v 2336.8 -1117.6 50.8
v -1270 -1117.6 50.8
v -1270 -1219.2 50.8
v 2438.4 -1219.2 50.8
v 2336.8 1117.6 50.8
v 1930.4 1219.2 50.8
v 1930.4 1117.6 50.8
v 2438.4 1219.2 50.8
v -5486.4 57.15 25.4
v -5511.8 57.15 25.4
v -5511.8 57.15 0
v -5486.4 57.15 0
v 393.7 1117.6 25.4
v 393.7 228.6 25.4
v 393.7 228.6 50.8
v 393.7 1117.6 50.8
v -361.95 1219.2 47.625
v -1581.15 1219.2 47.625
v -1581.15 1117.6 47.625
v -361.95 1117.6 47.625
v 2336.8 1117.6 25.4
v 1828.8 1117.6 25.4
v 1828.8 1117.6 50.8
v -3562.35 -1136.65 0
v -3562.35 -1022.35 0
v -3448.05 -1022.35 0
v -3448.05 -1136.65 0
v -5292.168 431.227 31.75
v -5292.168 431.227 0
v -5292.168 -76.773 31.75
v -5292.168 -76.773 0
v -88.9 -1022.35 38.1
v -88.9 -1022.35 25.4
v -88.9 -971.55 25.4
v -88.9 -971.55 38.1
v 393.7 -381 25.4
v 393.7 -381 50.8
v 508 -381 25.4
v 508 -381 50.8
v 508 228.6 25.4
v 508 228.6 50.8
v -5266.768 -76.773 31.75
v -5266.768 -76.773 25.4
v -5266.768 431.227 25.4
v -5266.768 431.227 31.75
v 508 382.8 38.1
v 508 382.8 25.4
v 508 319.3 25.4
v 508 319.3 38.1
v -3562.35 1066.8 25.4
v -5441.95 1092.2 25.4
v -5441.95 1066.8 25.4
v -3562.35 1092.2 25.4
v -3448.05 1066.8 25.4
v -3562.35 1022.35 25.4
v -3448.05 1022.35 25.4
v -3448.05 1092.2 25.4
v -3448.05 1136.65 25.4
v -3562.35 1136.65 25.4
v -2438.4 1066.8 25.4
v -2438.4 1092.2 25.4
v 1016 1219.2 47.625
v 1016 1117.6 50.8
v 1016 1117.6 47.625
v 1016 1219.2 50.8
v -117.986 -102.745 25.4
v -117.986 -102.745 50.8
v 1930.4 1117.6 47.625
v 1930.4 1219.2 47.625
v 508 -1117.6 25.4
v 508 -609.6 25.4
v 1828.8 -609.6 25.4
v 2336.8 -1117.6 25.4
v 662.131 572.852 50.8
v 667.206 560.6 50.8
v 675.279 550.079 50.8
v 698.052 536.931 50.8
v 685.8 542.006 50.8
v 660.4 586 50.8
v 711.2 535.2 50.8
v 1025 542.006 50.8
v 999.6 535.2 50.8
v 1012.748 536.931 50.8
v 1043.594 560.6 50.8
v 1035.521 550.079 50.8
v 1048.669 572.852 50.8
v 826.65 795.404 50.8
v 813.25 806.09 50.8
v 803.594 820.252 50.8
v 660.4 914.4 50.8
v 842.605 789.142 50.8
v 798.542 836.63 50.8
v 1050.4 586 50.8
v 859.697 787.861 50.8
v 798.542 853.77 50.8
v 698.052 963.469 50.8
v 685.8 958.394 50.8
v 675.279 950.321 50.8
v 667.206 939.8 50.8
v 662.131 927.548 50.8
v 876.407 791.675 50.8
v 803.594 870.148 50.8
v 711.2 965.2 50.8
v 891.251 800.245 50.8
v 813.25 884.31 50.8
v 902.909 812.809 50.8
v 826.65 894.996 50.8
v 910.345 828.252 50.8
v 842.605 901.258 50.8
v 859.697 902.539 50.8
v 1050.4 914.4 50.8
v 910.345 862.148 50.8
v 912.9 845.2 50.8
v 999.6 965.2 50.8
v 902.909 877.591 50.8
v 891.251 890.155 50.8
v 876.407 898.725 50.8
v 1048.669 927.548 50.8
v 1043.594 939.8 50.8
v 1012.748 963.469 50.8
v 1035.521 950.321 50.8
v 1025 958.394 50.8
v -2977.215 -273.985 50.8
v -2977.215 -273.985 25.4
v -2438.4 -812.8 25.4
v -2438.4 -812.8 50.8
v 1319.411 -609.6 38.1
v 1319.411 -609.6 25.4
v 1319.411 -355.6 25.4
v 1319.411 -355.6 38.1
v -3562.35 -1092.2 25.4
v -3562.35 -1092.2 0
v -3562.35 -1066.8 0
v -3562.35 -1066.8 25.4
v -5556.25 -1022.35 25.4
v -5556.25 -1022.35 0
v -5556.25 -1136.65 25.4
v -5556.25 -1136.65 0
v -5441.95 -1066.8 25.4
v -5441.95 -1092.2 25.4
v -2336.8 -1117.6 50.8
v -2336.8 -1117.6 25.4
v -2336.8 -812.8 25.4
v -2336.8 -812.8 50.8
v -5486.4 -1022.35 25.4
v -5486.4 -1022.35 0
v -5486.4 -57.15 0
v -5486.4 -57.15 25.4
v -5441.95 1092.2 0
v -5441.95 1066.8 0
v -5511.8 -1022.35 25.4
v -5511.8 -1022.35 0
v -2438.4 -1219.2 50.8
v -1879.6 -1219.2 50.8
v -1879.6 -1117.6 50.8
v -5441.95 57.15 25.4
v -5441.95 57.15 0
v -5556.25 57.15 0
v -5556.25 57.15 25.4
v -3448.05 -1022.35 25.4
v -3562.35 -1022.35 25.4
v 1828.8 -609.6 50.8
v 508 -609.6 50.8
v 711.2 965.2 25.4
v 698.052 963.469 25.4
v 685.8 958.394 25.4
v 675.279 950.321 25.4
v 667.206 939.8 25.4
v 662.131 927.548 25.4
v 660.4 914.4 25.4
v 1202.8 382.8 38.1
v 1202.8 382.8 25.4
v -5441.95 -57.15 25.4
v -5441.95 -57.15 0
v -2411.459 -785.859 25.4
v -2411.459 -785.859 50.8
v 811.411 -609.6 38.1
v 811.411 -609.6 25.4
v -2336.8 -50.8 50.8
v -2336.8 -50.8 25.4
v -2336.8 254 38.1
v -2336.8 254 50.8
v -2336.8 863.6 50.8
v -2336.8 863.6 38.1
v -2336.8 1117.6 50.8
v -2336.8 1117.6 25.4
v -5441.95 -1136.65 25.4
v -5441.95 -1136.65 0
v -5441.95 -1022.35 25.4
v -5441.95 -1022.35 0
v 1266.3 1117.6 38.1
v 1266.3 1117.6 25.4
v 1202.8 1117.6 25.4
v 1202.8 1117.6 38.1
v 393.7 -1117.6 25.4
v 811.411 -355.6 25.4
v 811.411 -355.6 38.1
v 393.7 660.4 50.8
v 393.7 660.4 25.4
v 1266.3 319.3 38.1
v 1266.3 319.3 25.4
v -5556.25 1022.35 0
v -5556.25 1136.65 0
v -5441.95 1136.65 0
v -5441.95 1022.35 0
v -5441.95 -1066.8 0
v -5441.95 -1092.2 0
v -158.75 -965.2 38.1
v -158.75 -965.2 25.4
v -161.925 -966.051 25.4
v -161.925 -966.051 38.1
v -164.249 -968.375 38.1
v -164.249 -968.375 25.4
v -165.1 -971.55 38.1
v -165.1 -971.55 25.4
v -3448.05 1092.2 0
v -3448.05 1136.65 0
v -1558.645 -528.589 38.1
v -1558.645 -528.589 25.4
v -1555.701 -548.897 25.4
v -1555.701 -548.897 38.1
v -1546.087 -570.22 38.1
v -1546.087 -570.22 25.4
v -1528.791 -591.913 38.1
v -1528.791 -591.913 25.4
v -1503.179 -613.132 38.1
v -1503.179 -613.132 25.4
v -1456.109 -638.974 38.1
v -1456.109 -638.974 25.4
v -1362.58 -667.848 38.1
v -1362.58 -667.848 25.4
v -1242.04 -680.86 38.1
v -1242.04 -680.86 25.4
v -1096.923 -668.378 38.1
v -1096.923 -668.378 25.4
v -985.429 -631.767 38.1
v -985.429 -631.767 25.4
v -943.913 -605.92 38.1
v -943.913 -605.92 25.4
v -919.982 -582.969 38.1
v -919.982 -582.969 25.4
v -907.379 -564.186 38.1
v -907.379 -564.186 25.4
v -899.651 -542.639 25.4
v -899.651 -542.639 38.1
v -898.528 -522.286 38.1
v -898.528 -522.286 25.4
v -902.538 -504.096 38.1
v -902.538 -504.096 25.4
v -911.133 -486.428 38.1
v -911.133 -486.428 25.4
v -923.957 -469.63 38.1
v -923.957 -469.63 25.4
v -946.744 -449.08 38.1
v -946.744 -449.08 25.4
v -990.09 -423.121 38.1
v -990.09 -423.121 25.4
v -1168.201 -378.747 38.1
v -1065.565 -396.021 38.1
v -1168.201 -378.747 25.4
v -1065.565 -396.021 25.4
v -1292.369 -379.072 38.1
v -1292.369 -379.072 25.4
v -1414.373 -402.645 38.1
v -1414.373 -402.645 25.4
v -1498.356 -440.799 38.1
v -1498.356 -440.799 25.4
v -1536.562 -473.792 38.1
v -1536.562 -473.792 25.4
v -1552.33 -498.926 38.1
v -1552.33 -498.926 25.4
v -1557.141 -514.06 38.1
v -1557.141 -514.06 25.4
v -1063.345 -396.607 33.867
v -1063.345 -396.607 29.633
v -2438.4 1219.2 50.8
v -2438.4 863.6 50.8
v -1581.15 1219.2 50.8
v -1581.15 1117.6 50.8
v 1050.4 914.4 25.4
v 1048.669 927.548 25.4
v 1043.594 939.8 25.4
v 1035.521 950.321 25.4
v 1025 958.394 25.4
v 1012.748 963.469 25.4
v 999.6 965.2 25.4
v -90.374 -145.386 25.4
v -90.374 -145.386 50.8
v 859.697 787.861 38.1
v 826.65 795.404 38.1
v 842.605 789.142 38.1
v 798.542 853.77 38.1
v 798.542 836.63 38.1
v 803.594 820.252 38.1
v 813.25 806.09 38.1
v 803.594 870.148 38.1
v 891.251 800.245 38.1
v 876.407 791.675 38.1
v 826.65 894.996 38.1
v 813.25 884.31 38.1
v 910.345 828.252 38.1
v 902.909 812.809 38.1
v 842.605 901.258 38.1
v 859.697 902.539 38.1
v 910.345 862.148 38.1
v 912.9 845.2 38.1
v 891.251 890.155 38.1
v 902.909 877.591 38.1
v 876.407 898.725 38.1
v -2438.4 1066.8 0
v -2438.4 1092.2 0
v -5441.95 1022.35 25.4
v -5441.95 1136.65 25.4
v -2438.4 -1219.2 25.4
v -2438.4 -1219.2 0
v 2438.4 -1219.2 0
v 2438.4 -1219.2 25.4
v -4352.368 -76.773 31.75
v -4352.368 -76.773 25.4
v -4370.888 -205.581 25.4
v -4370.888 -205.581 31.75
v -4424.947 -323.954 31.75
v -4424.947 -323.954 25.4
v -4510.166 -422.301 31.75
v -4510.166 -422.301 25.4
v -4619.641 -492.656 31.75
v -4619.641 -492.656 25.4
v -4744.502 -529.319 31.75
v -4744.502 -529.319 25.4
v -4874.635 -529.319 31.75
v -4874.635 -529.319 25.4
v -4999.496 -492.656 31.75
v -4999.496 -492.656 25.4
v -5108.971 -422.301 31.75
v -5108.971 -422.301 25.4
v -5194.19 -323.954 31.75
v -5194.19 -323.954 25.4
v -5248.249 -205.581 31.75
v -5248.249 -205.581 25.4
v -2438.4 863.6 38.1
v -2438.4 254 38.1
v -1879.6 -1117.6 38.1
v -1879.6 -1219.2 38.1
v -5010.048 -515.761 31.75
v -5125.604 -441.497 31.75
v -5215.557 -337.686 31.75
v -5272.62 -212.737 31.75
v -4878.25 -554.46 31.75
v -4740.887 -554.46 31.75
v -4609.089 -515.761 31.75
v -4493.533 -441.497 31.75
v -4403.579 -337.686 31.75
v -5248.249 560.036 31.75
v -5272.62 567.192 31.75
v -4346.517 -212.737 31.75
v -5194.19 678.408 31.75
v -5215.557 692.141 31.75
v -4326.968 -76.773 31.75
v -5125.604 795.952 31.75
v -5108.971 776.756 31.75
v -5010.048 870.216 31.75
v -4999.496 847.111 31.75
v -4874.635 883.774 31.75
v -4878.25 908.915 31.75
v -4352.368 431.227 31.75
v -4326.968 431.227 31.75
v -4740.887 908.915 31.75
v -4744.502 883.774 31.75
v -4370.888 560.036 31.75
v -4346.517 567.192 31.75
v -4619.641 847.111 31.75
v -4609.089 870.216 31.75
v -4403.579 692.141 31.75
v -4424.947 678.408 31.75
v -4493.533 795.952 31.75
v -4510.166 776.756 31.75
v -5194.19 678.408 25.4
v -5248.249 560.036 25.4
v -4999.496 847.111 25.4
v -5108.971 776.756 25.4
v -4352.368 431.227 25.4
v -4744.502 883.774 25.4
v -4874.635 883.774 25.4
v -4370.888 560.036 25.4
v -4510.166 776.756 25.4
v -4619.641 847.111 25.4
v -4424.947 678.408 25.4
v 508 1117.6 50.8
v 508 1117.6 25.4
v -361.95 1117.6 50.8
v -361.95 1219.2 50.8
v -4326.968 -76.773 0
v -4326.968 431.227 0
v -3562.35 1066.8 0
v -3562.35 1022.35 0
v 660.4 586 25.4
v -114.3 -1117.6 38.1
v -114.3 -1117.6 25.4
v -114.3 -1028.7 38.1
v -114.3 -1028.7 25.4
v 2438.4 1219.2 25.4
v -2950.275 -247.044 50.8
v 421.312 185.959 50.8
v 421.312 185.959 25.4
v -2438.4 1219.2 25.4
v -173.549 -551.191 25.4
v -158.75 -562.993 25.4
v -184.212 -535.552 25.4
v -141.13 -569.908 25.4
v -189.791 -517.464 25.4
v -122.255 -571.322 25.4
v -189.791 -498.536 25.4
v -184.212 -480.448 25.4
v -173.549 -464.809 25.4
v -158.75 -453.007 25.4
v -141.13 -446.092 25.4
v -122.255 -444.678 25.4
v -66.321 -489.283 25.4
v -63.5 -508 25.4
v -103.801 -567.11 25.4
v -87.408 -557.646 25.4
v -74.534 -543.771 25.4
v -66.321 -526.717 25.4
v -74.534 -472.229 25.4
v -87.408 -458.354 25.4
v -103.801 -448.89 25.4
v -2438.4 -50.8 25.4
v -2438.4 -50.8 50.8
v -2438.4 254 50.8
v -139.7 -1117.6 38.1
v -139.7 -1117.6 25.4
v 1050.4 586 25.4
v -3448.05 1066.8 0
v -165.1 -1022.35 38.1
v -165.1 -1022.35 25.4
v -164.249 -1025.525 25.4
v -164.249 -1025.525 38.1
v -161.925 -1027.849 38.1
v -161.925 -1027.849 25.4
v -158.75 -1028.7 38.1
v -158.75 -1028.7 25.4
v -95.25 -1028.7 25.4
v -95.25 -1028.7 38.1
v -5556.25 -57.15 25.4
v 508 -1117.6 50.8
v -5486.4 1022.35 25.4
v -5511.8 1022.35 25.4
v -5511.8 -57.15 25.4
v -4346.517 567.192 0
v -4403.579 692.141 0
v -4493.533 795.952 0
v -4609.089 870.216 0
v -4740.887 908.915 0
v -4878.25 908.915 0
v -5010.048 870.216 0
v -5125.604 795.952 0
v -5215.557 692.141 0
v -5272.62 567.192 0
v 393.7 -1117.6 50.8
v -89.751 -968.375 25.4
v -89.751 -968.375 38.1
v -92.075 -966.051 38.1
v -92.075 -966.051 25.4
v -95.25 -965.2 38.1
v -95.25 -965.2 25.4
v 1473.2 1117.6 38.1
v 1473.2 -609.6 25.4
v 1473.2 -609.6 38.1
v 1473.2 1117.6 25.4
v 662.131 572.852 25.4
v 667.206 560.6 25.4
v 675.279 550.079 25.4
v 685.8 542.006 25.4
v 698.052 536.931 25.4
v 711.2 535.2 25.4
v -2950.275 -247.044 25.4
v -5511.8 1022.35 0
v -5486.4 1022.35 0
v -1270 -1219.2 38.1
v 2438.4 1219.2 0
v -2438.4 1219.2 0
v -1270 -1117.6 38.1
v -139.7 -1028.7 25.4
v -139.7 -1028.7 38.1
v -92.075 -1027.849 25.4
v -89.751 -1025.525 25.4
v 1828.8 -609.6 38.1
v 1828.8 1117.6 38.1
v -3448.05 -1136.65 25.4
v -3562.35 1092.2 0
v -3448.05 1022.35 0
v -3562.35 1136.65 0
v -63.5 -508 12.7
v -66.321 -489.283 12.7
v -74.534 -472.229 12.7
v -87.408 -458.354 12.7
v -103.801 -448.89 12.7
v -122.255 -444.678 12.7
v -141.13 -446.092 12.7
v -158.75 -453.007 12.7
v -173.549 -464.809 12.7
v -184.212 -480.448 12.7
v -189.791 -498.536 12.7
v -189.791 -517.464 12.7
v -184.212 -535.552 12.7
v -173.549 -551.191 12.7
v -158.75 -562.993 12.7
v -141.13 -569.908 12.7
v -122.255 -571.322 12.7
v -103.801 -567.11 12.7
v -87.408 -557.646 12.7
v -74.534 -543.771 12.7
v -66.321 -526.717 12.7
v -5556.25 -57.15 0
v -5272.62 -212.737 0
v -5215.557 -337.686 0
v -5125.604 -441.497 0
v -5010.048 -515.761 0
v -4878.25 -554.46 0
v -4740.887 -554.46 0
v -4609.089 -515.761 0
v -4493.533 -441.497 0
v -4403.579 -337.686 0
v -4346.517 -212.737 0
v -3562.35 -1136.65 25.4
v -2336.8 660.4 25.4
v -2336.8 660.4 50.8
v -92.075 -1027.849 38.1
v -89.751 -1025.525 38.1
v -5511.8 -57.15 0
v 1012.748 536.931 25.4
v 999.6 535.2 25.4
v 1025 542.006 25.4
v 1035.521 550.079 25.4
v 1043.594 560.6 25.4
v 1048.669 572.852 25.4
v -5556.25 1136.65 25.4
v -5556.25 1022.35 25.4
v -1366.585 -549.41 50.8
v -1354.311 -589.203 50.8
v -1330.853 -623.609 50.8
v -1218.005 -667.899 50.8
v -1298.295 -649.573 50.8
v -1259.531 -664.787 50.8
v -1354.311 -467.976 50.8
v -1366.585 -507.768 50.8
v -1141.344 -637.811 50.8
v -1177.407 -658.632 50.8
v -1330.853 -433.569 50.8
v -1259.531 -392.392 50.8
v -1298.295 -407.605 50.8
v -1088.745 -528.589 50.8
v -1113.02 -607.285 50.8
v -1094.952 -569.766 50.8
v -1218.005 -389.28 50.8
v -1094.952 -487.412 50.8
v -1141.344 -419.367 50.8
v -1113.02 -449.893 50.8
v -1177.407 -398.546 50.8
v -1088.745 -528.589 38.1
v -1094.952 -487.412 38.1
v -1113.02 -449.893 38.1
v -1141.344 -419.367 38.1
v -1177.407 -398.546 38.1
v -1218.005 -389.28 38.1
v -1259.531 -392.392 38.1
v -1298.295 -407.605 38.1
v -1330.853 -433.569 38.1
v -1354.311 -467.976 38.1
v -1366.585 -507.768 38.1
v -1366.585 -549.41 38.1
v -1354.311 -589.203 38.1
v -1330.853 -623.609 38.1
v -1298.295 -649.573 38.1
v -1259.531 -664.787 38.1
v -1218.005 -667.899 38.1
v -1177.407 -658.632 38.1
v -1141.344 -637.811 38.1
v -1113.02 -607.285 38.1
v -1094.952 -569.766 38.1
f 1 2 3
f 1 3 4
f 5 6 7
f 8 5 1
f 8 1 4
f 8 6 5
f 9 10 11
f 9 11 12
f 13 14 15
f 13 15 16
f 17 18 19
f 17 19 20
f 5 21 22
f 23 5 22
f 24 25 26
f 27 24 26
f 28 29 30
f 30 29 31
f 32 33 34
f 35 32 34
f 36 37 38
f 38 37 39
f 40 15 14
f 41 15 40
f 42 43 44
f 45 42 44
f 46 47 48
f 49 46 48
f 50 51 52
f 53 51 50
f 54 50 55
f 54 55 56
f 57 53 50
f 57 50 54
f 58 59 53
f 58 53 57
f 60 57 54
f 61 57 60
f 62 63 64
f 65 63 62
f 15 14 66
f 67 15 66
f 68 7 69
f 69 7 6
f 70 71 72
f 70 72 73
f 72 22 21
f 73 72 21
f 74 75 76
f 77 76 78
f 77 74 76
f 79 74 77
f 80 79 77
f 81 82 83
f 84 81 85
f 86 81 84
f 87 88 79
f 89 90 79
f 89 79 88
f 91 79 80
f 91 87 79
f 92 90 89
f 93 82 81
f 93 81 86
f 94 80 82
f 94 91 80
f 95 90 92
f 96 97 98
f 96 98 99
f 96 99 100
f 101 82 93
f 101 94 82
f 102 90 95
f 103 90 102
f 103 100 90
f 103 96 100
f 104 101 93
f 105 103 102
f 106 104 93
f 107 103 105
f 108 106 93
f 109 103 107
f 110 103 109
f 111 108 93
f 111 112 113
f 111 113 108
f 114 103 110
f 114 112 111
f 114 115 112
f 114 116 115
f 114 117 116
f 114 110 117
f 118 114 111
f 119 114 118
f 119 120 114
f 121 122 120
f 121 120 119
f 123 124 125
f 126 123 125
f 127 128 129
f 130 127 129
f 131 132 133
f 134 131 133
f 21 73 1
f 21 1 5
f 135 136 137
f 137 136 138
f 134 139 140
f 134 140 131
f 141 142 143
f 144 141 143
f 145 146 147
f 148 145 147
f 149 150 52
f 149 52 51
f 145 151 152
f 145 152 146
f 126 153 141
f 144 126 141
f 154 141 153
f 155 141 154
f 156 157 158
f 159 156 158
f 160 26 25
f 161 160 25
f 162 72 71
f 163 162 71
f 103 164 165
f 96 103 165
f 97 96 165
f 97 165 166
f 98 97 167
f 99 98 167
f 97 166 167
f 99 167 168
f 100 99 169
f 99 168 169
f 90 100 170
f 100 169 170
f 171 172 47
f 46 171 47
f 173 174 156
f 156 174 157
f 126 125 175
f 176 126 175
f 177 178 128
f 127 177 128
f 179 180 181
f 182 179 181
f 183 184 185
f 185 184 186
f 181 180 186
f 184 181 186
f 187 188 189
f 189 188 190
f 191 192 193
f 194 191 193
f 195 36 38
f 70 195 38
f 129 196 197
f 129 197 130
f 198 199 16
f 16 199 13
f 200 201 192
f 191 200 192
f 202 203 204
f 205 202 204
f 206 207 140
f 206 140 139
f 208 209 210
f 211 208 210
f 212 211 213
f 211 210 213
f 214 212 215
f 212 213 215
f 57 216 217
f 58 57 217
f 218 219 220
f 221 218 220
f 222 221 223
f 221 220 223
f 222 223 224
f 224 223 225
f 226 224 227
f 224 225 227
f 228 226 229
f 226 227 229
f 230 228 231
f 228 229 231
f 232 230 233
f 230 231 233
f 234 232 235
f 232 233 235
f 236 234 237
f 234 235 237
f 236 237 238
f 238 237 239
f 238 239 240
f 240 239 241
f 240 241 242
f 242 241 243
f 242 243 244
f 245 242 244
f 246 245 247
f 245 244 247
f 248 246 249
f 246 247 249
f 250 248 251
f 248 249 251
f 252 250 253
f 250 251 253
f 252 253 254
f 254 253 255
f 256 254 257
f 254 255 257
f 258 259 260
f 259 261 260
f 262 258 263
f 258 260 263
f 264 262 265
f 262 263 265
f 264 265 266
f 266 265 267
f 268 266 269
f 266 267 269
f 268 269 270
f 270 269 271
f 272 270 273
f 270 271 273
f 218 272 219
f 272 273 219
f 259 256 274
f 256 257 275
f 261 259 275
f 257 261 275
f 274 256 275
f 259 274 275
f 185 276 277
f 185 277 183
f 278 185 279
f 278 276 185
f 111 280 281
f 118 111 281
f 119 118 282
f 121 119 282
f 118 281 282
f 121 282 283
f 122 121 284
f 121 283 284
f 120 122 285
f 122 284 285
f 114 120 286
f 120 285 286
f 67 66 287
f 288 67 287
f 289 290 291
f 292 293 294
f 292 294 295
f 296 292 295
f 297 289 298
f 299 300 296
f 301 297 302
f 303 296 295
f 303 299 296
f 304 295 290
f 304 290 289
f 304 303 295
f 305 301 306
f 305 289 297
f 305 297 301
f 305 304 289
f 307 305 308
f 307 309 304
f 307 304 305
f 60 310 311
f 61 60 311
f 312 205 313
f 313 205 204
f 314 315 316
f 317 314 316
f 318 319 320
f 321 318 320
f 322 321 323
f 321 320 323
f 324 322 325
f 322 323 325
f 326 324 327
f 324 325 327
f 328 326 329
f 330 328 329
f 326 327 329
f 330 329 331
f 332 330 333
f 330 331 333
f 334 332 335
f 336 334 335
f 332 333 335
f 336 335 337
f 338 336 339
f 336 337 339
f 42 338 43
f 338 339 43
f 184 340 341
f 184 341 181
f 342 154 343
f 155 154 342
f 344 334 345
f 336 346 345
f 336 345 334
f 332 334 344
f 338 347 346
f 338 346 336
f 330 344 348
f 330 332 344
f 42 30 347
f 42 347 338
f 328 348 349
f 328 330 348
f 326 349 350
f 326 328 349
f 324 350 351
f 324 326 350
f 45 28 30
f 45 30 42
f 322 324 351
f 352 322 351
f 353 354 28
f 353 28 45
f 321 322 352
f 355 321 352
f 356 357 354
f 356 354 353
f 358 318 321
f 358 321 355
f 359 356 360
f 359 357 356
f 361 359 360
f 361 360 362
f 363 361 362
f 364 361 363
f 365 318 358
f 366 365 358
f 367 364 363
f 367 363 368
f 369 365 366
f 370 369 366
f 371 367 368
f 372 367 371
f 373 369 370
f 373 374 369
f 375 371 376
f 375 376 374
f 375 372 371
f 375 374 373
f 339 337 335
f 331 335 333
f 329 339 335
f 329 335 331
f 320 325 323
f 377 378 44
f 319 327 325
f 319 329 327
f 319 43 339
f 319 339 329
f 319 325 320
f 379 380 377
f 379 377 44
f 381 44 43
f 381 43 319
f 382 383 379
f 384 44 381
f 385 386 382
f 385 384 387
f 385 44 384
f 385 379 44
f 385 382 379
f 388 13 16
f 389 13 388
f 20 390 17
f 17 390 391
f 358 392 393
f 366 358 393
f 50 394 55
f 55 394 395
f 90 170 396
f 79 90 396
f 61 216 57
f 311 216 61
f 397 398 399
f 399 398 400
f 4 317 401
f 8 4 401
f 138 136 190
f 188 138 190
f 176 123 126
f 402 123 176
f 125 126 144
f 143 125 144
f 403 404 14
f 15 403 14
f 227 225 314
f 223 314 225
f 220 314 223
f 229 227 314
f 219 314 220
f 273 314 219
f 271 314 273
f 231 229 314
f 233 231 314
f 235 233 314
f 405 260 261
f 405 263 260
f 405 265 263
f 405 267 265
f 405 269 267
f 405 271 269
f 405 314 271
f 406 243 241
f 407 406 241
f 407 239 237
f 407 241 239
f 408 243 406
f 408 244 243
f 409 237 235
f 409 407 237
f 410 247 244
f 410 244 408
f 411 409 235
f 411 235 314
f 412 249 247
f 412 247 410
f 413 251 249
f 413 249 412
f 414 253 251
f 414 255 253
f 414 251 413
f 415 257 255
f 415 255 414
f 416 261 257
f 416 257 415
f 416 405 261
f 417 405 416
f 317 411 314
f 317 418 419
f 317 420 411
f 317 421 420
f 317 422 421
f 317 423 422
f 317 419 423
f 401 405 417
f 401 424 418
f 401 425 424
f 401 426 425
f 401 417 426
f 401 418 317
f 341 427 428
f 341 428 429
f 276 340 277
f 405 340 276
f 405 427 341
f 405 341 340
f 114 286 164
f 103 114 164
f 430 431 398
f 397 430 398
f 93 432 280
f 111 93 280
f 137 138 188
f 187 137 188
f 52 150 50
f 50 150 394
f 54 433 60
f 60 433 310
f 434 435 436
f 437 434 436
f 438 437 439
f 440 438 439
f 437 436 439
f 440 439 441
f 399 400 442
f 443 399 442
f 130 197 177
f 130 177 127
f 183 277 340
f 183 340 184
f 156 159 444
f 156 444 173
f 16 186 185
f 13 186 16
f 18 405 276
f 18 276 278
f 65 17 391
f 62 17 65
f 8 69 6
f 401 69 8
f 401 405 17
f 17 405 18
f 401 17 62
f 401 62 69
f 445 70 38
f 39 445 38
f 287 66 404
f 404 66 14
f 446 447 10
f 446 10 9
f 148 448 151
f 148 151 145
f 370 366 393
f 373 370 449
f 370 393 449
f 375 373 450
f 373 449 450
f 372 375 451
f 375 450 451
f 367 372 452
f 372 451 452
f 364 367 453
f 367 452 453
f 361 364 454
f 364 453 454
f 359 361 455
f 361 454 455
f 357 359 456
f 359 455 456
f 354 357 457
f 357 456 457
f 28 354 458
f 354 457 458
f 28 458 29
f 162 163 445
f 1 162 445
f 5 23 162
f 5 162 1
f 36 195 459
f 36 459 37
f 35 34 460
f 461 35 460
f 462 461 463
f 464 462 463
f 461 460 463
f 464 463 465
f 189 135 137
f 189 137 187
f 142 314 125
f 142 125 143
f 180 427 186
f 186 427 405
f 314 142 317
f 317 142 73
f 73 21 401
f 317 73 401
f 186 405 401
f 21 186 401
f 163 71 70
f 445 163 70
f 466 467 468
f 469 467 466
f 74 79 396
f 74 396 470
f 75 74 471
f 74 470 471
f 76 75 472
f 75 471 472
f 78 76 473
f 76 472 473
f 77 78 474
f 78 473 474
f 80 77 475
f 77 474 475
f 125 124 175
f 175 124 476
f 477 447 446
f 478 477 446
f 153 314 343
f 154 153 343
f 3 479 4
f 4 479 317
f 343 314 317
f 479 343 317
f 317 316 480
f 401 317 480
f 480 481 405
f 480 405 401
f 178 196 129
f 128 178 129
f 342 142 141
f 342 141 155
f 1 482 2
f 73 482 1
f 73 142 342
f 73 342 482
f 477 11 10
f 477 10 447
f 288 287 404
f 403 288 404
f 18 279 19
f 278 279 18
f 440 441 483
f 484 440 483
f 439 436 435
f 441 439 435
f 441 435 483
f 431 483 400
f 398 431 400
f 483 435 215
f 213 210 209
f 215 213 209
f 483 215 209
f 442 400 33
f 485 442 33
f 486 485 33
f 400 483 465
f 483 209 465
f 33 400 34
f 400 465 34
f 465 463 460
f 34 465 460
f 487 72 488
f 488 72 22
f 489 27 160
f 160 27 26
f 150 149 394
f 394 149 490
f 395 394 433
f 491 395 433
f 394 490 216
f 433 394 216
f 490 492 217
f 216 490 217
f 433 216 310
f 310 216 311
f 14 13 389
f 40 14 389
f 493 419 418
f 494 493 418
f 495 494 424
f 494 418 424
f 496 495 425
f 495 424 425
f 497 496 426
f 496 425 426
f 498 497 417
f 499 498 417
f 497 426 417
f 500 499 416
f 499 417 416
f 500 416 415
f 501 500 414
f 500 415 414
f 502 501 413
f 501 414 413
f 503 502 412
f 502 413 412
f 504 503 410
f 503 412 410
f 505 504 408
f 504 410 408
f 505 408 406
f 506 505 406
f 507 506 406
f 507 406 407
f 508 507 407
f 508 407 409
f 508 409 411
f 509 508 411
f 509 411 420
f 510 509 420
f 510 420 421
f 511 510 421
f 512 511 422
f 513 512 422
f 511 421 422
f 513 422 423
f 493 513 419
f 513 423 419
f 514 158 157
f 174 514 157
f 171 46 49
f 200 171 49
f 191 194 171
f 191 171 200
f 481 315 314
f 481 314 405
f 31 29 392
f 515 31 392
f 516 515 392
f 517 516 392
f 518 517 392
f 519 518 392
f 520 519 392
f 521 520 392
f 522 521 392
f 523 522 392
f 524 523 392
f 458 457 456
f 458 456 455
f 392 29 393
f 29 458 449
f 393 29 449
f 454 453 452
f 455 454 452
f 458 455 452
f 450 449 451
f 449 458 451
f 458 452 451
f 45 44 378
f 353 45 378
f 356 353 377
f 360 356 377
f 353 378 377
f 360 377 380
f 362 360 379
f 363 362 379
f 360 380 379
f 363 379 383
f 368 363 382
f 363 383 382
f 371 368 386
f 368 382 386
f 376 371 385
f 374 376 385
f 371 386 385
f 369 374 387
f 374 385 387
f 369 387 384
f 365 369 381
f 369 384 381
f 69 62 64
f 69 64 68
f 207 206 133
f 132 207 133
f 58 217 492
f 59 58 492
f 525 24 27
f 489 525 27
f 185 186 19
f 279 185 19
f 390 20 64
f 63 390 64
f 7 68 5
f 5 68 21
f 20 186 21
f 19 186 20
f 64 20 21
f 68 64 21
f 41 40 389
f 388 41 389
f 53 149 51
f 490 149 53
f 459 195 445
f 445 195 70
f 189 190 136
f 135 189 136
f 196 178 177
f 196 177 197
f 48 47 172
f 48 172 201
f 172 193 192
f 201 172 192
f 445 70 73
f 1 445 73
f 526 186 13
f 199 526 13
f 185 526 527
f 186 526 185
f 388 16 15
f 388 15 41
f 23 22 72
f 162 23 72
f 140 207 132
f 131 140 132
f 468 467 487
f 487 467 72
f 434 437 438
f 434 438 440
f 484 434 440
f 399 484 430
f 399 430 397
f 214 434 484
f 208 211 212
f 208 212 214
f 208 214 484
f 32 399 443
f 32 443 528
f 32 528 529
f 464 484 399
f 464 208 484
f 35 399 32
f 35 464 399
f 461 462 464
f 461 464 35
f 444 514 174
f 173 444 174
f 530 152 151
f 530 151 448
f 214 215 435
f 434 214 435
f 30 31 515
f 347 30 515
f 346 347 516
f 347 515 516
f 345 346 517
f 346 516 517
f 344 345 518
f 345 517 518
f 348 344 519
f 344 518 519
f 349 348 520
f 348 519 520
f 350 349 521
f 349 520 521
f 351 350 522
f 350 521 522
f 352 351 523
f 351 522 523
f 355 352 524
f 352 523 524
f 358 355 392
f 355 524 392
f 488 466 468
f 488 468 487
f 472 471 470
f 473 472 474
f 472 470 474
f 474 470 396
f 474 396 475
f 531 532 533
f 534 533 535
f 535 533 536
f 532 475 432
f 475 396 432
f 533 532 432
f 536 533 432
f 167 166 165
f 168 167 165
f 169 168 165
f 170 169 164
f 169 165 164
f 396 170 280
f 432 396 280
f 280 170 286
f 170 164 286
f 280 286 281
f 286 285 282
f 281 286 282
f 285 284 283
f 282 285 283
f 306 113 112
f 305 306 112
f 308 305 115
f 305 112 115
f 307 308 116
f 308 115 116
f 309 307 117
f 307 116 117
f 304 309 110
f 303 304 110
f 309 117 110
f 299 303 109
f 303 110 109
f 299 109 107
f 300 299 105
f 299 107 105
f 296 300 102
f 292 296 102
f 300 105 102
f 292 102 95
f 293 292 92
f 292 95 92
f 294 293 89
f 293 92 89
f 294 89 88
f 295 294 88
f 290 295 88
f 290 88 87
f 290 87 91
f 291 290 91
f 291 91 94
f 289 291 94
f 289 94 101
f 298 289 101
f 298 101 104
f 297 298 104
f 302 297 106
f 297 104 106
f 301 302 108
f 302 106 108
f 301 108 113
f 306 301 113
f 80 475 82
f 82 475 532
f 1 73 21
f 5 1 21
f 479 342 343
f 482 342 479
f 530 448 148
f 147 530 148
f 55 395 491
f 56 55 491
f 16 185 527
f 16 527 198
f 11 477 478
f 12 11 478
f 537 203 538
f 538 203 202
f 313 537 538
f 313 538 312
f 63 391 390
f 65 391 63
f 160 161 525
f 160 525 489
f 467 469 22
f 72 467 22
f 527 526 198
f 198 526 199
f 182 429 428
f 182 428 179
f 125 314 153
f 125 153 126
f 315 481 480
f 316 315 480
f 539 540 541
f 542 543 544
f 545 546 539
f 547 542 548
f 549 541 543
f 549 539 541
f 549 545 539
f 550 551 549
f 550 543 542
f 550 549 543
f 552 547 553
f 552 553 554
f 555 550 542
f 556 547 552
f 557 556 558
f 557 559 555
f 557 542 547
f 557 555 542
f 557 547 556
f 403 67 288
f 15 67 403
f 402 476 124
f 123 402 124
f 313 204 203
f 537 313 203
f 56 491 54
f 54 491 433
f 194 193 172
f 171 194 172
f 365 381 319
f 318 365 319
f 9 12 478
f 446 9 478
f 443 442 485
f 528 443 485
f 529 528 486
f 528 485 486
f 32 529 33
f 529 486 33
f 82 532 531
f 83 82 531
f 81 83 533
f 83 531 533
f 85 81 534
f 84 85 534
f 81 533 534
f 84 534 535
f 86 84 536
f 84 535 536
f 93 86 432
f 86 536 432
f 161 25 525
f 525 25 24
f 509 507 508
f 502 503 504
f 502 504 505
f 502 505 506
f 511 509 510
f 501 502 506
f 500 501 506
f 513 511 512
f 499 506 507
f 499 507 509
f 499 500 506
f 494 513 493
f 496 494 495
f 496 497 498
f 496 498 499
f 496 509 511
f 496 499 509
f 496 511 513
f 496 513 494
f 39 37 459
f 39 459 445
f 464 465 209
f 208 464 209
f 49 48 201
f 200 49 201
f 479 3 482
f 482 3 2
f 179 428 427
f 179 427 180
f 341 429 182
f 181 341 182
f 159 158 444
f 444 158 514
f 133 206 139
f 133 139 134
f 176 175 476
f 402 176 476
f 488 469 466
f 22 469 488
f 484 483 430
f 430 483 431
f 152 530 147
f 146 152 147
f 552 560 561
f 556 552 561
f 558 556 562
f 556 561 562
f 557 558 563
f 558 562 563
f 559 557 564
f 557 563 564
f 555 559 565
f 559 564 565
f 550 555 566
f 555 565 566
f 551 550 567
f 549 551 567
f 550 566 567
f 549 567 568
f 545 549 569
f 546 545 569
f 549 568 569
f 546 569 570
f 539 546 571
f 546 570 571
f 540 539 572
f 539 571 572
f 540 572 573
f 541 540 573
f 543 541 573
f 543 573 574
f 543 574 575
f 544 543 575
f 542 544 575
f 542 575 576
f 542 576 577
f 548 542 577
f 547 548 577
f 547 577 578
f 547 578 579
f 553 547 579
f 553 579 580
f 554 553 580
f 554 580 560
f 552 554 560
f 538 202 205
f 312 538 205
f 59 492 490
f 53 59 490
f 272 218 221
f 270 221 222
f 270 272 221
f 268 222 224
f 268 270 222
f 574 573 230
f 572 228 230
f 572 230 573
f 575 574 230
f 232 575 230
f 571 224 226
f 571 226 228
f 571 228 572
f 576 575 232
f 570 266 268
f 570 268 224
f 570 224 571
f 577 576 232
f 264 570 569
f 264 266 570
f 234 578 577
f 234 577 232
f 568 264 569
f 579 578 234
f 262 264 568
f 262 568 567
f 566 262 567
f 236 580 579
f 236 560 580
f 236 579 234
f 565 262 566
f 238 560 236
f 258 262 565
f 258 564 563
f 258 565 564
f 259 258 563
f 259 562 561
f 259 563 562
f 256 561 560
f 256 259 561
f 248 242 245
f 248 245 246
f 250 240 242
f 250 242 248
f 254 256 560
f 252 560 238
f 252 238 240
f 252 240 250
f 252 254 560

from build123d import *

# Parameters (mm, degrees)
F0_W      = 4876.8
F0_H      = 2438.4
F1_DEPTH  = 25.4
F2_W      = 4876.8
F2_H      = 2438.4
F2_W_2    = 4673.6
F2_H_2    = 2235.2
F3_DEPTH  = 25.4
F4_W      = 114.3
F4_H      = 2235.2
F5_DEPTH  = 25.4
F6_W      = 114.3
F6_H      = 609.6
F7_DEPTH  = 25.4
F8_W      = 101.6
F8_H      = 762
F9_DEPTH  = 25.4
F11_DEPTH = 25.4
F13_DEPTH = 25.4
F14_W     = 355.6
F14_H     = 1727.2
F15_DEPTH = 12.7
F17_DEPTH = 25.4
F19_DEPTH = 25.4
F20_R     = 63.5
F21_DEPTH = 12.7
F23_DEPTH = 12.7
F24_W     = 2730.5
F24_H     = 457.2
F25_DEPTH = 25.4
F26_W     = 609.6
F26_H     = 101.6
F26_W_2   = 101.6
F26_H_2   = 609.6
F27_DEPTH = 12.7
F28_R     = 57.5
F29_DEPTH = 12.7
F31_DEPTH = 25.4
F30_W     = 1879.6
F30_H     = 25.4
F32_DEPTH = 25.4
F30_W_2   = 25.4
F30_H_2   = 965.2
F30_W_3   = 1009.65
F33_R     = 139.7
F34_DEPTH = 25.4
F35_DEPTH = 12.7
F37_DEPTH = 25.4
F39_DEPTH = 6.35
F40_W     = 1219.2
F40_H     = 101.6
F40_W_2   = 914.4
F41_DEPTH = 3.175
F42_W     = 508
F42_H     = 254
F43_DEPTH = 12.7
F45_DEPTH = 12.7


# Not quite as in the source:
# - a feature names something its author has since deleted; it is built from what else it names


with BuildPart() as f1:
    # F0 (on Top) → F1 (new body)
    with BuildSketch(Plane.XY):
        Rectangle(F0_W, F0_H)
    extrude(amount=F1_DEPTH)

    # F20 (on face) → F21 (cut)
    with BuildSketch(Plane.XY.offset(25.4)):
        with Locations((-127, -508)):
            Circle(F20_R)
    extrude(amount=-F21_DEPTH, mode=Mode.SUBTRACT)

    # F33 (on face) → F34 (join)
    with BuildSketch(Plane.XY.offset(25.4)):
        with Locations((-1228.4452915192, -528.5891890526)):
            Circle(F33_R)
    extrude(amount=F34_DEPTH)

    # F33 (on face) → F35 (join)
    with BuildSketch(Plane.XY.offset(25.4)):
        with BuildLine():
            add(Edge.make_bspline(
                [(-1558.6452915192, -528.5891890526), (-1558.6452915192, -792.5537321261), (-1063.3452915192, -660.5714605893), (-568.0452915192, -528.5891890526), (-1063.3452915192, -396.6069175158), (-1558.6452915192, -264.6246459791), (-1558.6452915192, -528.5891890526)],
                knots=[0, 0, 0, 2.0943951024, 2.0943951024, 4.1887902048, 4.1887902048, 6.2831853072, 6.2831853072, 6.2831853072], degree=2, weights=[1, 0.5, 1, 0.5, 1, 0.5, 1]))
        make_face()
        with Locations((-1228.4452915192, -528.5891890526)):
            Circle(F33_R, mode=Mode.SUBTRACT)
    extrude(amount=F35_DEPTH)


with BuildPart() as f3:
    # F2 (on face) → F3 (new body)
    with BuildSketch(Plane.XY.offset(25.4)):
        Rectangle(F2_W, F2_H)
        Rectangle(F2_W_2, F2_H_2, mode=Mode.SUBTRACT)
    extrude(amount=F3_DEPTH)

    # F8 (on face) → F9 (cut)
    with BuildSketch(Plane.XY.offset(50.8)):
        with Locations((-2387.6, -431.8)):
            Rectangle(F8_W, F8_H)
    extrude(amount=-F9_DEPTH, mode=Mode.SUBTRACT)

    # F26 (on face) → F27 (cut)
    with BuildSketch(Plane.XY.offset(50.8)):
        with Locations((-1574.8, -1168.4)):
            Rectangle(F26_W, F26_H)
        with Locations((-2387.6, 558.8)):
            Rectangle(F26_W_2, F26_H_2)
    extrude(amount=-F27_DEPTH, mode=Mode.SUBTRACT)

    # F40 (on face) → F41 (cut)
    with BuildSketch(Plane.XY.offset(50.8)):
        with Locations((-971.55, 1168.4)):
            Rectangle(F40_W, F40_H)
        with Locations((1473.2, 1168.4)):
            Rectangle(F40_W_2, F40_H)
    extrude(amount=-F41_DEPTH, mode=Mode.SUBTRACT)


with BuildPart() as f5:
    # F4 (on face) → F5 (new body)
    with BuildSketch(Plane.XY.offset(25.4)):
        with Locations((450.85, 0)):
            Rectangle(F4_W, F4_H)
    extrude(amount=F5_DEPTH)

    # F6 (on face) → F7 (cut)
    with BuildSketch(Plane.XY.offset(50.8)):
        with Locations((450.85, -76.2)):
            Rectangle(F6_W, F6_H)
    extrude(amount=-F7_DEPTH, mode=Mode.SUBTRACT)


with BuildPart() as f11:
    # F10 (on face) → F11 (new body)
    with BuildSketch(Plane.XY.offset(25.4)):
        with BuildLine():
            Line((999.6, 965.2), (711.2, 965.2))
            ThreePointArc((711.2, 965.2), (675.2789755157, 950.3210244843), (660.4, 914.4))
            Line((660.4, 914.4), (660.4, 586))
            ThreePointArc((660.4, 586), (675.2789755157, 550.0789755157), (711.2, 535.2))
            Line((711.2, 535.2), (999.6, 535.2))
            ThreePointArc((999.6, 535.2), (1035.5210244843, 550.0789755157), (1050.4, 586))
            Line((1050.4, 586), (1050.4, 914.4))
            ThreePointArc((1050.4, 914.4), (1035.5210244843, 950.3210244843), (999.6, 965.2))
        make_face()
    extrude(amount=F11_DEPTH)

    # F28 (on face) → F29 (cut)
    with BuildSketch(Plane.XY.offset(50.8)):
        with Locations((855.4, 845.2)):
            Circle(F28_R)
    extrude(amount=-F29_DEPTH, mode=Mode.SUBTRACT)


with BuildPart() as f13:
    # F12 (on face) → F13 (new body)
    with BuildSketch(Plane.XY.offset(25.4)):
        Polygon((508, -609.6), (508, -1117.6), (2336.8, -1117.6), (2336.8, 1117.6), (1828.8, 1117.6), (1828.8, -609.6), align=None)
    extrude(amount=F13_DEPTH)


with BuildPart() as f15:
    # F14 (on face) → F15 (new body)
    with BuildSketch(Plane.XY.offset(25.4)):
        with Locations((1651, 254)):
            Rectangle(F14_W, F14_H)
    extrude(amount=F15_DEPTH)


with BuildPart() as f17:
    # F16 (on face) → F17 (new body)
    with BuildSketch(Plane.XY.offset(25.4)):
        Polygon((421.3120895758, 185.9594968457), (393.7, 228.6), (-117.9860378521, -102.7450749101), (-90.3739482763, -145.3855780644), align=None)
    extrude(amount=F17_DEPTH)


with BuildPart() as f19:
    # F18 (on face) → F19 (new body)
    with BuildSketch(Plane.XY.offset(25.4)):
        Polygon((-2438.4, -812.8), (-2411.4592316368, -785.8592316368), (-2950.2745989009, -247.0438643726), (-2977.2153672641, -273.9846327359), align=None)
    extrude(amount=F19_DEPTH)


with BuildPart() as f23:
    # F22 (on face) → F23 (new body)
    with BuildSketch(Plane.XY.offset(25.4)):
        with BuildLine():
            Line((-139.7, -1028.7), (-139.7, -1117.6))
            Line((-139.7, -1117.6), (-114.3, -1117.6))
            Line((-114.3, -1117.6), (-114.3, -1028.7))
            Line((-114.3, -1028.7), (-95.25, -1028.7))
            ThreePointArc((-95.25, -1028.7), (-90.7598719395, -1026.8401280605), (-88.9, -1022.35))
            Line((-88.9, -1022.35), (-88.9, -971.55))
            ThreePointArc((-88.9, -971.55), (-90.7598719395, -967.0598719395), (-95.25, -965.2))
            Line((-95.25, -965.2), (-158.75, -965.2))
            ThreePointArc((-158.75, -965.2), (-163.2401280605, -967.0598719395), (-165.1, -971.55))
            Line((-165.1, -971.55), (-165.1, -1022.35))
            ThreePointArc((-165.1, -1022.35), (-163.2401280605, -1026.8401280605), (-158.75, -1028.7))
            Line((-158.75, -1028.7), (-139.7, -1028.7))
        make_face()
    extrude(amount=F23_DEPTH)


with BuildPart() as f25:
    # F24 (on face) → F25 (new body)
    with BuildSketch(Plane.XY.offset(25.4)):
        with Locations((-971.55, 889)):
            Rectangle(F24_W, F24_H)
    extrude(amount=F25_DEPTH)


with BuildPart() as f31:
    # F30 (on Top) → F31 (new body)
    with BuildSketch(Plane.XY):
        Polygon((-5441.95, -1022.35), (-5486.4, -1022.35), (-5511.8, -1022.35), (-5556.25, -1022.35), (-5556.25, -1136.65), (-5441.95, -1136.65), (-5441.95, -1092.2), (-5441.95, -1066.8), align=None)
    extrude(amount=F31_DEPTH)


with BuildPart() as f31b:
    # F30 (on Top) → F31, piece 2 (new body)
    with BuildSketch(Plane.XY):
        Polygon((-3562.35, -1022.35), (-3562.35, -1066.8), (-3562.35, -1092.2), (-3562.35, -1136.65), (-3448.05, -1136.65), (-3448.05, -1022.35), align=None)
    extrude(amount=F31_DEPTH)


with BuildPart() as f31c:
    # F30 (on Top) → F31, piece 3 (new body)
    with BuildSketch(Plane.XY):
        Polygon((-5441.95, 57.15), (-5486.4, 57.15), (-5511.8, 57.15), (-5556.25, 57.15), (-5556.25, -57.15), (-5511.8, -57.15), (-5486.4, -57.15), (-5441.95, -57.15), align=None)
    extrude(amount=F31_DEPTH)


with BuildPart() as f31d:
    # F30 (on Top) → F31, piece 4 (new body)
    with BuildSketch(Plane.XY):
        Polygon((-5486.4, 1022.35), (-5441.95, 1022.35), (-5441.95, 1066.8), (-5441.95, 1092.2), (-5441.95, 1136.65), (-5556.25, 1136.65), (-5556.25, 1022.35), (-5511.8, 1022.35), align=None)
    extrude(amount=F31_DEPTH)


with BuildPart() as f32:
    # F30 (on Top) → F32 (new body)
    with BuildSketch(Plane.XY):
        with Locations((-4502.15, -1079.5)):
            Rectangle(F30_W, F30_H)
    extrude(amount=F32_DEPTH)


with BuildPart() as f32b:
    # F30 (on Top) → F32, piece 2 (new body)
    with BuildSketch(Plane.XY):
        with Locations((-5499.1, -539.75)):
            Rectangle(F30_W_2, F30_H_2)
    extrude(amount=F32_DEPTH)


with BuildPart() as f32c:
    # F30 (on Top) → F32, piece 3 (new body)
    with BuildSketch(Plane.XY):
        with Locations((-5499.1, 539.75)):
            Rectangle(F30_W_2, F30_H_2)
    extrude(amount=F32_DEPTH)


with BuildPart() as f32d:
    # F30 (on Top) → F32, piece 4 (new body)
    with BuildSketch(Plane.XY):
        with Locations((-4502.15, 1079.5)):
            Rectangle(F30_W, F30_H)
        Polygon((-3562.35, 1092.2), (-3562.35, 1066.8), (-3562.35, 1022.35), (-3448.05, 1022.35), (-3448.05, 1066.8), (-3448.05, 1092.2), (-3448.05, 1136.65), (-3562.35, 1136.65), align=None)
        with Locations((-2943.225, 1079.5)):
            Rectangle(F30_W_3, F30_H)
    extrude(amount=F32_DEPTH)


with BuildPart() as f37:
    # F36 (on Top) → F37 (new body)
    with BuildSketch(Plane.XY):
        with BuildLine():
            ThreePointArc((-4809.5684051514, 913.8274442911), (-5150.818137752, 772.4771768917), (-5292.1684051514, 431.2274442911))
            Line((-5292.1684051514, 431.2274442911), (-5292.1684051514, -76.7725557089))
            ThreePointArc((-5292.1684051514, -76.7725557089), (-5150.818137752, -418.0222883095), (-4809.5684051514, -559.3725557089))
            ThreePointArc((-4809.5684051514, -559.3725557089), (-4468.3186725507, -418.0222883095), (-4326.9684051514, -76.7725557089))
            Line((-4326.9684051514, -76.7725557089), (-4326.9684051514, 431.2274442911))
            ThreePointArc((-4326.9684051514, 431.2274442911), (-4468.3186725507, 772.4771768917), (-4809.5684051514, 913.8274442911))
        make_face()
    extrude(amount=F37_DEPTH)

    # F38 (on face) → F39 (join)
    with BuildSketch(Plane.XY.offset(25.4)):
        with BuildLine():
            Line((-4326.9684051514, -76.7725557089), (-4326.9684051514, 431.2274442911))
            ThreePointArc((-4326.9684051514, 431.2274442911), (-4809.5684051514, 913.8274442911), (-5292.1684051514, 431.2274442911))
            Line((-5292.1684051514, 431.2274442911), (-5292.1684051514, -76.7725557089))
            ThreePointArc((-5292.1684051514, -76.7725557089), (-4809.5684051514, -559.3725557089), (-4326.9684051514, -76.7725557089))
        make_face()
        with BuildLine():
            ThreePointArc((-5266.7684051514, 431.2274442911), (-4809.5684051514, 888.4274442911), (-4352.3684051514, 431.2274442911))
            Line((-4352.3684051514, 431.2274442911), (-4352.3684051514, -76.7725557089))
            ThreePointArc((-4352.3684051514, -76.7725557089), (-4809.5684051514, -533.9725557089), (-5266.7684051514, -76.7725557089))
            Line((-5266.7684051514, -76.7725557089), (-5266.7684051514, 431.2274442911))
        make_face(mode=Mode.SUBTRACT)
    extrude(amount=F39_DEPTH)


with BuildPart() as f43:
    # F42 (on face) → F43 (new body)
    with BuildSketch(Plane.XY.offset(25.4)):
        with Locations((1065.4114627128, -482.6)):
            Rectangle(F42_W, F42_H)
    extrude(amount=F43_DEPTH)


with BuildPart() as f45:
    # F44 (on face) → F45 (new body)
    with BuildSketch(Plane.XY.offset(25.4)):
        Polygon((1202.8, 382.8), (508, 382.8), (508, 319.3), (1266.3, 319.3), (1266.3, 1117.6), (1202.8, 1117.6), align=None)
    extrude(amount=F45_DEPTH)


solid = Compound([f1.part, f3.part, f5.part, f11.part, f13.part, f15.part, f17.part, f19.part, f23.part, f25.part, f31.part, f31b.part, f31c.part, f31d.part, f32.part, f32b.part, f32c.part, f32d.part, f37.part, f43.part, f45.part])
